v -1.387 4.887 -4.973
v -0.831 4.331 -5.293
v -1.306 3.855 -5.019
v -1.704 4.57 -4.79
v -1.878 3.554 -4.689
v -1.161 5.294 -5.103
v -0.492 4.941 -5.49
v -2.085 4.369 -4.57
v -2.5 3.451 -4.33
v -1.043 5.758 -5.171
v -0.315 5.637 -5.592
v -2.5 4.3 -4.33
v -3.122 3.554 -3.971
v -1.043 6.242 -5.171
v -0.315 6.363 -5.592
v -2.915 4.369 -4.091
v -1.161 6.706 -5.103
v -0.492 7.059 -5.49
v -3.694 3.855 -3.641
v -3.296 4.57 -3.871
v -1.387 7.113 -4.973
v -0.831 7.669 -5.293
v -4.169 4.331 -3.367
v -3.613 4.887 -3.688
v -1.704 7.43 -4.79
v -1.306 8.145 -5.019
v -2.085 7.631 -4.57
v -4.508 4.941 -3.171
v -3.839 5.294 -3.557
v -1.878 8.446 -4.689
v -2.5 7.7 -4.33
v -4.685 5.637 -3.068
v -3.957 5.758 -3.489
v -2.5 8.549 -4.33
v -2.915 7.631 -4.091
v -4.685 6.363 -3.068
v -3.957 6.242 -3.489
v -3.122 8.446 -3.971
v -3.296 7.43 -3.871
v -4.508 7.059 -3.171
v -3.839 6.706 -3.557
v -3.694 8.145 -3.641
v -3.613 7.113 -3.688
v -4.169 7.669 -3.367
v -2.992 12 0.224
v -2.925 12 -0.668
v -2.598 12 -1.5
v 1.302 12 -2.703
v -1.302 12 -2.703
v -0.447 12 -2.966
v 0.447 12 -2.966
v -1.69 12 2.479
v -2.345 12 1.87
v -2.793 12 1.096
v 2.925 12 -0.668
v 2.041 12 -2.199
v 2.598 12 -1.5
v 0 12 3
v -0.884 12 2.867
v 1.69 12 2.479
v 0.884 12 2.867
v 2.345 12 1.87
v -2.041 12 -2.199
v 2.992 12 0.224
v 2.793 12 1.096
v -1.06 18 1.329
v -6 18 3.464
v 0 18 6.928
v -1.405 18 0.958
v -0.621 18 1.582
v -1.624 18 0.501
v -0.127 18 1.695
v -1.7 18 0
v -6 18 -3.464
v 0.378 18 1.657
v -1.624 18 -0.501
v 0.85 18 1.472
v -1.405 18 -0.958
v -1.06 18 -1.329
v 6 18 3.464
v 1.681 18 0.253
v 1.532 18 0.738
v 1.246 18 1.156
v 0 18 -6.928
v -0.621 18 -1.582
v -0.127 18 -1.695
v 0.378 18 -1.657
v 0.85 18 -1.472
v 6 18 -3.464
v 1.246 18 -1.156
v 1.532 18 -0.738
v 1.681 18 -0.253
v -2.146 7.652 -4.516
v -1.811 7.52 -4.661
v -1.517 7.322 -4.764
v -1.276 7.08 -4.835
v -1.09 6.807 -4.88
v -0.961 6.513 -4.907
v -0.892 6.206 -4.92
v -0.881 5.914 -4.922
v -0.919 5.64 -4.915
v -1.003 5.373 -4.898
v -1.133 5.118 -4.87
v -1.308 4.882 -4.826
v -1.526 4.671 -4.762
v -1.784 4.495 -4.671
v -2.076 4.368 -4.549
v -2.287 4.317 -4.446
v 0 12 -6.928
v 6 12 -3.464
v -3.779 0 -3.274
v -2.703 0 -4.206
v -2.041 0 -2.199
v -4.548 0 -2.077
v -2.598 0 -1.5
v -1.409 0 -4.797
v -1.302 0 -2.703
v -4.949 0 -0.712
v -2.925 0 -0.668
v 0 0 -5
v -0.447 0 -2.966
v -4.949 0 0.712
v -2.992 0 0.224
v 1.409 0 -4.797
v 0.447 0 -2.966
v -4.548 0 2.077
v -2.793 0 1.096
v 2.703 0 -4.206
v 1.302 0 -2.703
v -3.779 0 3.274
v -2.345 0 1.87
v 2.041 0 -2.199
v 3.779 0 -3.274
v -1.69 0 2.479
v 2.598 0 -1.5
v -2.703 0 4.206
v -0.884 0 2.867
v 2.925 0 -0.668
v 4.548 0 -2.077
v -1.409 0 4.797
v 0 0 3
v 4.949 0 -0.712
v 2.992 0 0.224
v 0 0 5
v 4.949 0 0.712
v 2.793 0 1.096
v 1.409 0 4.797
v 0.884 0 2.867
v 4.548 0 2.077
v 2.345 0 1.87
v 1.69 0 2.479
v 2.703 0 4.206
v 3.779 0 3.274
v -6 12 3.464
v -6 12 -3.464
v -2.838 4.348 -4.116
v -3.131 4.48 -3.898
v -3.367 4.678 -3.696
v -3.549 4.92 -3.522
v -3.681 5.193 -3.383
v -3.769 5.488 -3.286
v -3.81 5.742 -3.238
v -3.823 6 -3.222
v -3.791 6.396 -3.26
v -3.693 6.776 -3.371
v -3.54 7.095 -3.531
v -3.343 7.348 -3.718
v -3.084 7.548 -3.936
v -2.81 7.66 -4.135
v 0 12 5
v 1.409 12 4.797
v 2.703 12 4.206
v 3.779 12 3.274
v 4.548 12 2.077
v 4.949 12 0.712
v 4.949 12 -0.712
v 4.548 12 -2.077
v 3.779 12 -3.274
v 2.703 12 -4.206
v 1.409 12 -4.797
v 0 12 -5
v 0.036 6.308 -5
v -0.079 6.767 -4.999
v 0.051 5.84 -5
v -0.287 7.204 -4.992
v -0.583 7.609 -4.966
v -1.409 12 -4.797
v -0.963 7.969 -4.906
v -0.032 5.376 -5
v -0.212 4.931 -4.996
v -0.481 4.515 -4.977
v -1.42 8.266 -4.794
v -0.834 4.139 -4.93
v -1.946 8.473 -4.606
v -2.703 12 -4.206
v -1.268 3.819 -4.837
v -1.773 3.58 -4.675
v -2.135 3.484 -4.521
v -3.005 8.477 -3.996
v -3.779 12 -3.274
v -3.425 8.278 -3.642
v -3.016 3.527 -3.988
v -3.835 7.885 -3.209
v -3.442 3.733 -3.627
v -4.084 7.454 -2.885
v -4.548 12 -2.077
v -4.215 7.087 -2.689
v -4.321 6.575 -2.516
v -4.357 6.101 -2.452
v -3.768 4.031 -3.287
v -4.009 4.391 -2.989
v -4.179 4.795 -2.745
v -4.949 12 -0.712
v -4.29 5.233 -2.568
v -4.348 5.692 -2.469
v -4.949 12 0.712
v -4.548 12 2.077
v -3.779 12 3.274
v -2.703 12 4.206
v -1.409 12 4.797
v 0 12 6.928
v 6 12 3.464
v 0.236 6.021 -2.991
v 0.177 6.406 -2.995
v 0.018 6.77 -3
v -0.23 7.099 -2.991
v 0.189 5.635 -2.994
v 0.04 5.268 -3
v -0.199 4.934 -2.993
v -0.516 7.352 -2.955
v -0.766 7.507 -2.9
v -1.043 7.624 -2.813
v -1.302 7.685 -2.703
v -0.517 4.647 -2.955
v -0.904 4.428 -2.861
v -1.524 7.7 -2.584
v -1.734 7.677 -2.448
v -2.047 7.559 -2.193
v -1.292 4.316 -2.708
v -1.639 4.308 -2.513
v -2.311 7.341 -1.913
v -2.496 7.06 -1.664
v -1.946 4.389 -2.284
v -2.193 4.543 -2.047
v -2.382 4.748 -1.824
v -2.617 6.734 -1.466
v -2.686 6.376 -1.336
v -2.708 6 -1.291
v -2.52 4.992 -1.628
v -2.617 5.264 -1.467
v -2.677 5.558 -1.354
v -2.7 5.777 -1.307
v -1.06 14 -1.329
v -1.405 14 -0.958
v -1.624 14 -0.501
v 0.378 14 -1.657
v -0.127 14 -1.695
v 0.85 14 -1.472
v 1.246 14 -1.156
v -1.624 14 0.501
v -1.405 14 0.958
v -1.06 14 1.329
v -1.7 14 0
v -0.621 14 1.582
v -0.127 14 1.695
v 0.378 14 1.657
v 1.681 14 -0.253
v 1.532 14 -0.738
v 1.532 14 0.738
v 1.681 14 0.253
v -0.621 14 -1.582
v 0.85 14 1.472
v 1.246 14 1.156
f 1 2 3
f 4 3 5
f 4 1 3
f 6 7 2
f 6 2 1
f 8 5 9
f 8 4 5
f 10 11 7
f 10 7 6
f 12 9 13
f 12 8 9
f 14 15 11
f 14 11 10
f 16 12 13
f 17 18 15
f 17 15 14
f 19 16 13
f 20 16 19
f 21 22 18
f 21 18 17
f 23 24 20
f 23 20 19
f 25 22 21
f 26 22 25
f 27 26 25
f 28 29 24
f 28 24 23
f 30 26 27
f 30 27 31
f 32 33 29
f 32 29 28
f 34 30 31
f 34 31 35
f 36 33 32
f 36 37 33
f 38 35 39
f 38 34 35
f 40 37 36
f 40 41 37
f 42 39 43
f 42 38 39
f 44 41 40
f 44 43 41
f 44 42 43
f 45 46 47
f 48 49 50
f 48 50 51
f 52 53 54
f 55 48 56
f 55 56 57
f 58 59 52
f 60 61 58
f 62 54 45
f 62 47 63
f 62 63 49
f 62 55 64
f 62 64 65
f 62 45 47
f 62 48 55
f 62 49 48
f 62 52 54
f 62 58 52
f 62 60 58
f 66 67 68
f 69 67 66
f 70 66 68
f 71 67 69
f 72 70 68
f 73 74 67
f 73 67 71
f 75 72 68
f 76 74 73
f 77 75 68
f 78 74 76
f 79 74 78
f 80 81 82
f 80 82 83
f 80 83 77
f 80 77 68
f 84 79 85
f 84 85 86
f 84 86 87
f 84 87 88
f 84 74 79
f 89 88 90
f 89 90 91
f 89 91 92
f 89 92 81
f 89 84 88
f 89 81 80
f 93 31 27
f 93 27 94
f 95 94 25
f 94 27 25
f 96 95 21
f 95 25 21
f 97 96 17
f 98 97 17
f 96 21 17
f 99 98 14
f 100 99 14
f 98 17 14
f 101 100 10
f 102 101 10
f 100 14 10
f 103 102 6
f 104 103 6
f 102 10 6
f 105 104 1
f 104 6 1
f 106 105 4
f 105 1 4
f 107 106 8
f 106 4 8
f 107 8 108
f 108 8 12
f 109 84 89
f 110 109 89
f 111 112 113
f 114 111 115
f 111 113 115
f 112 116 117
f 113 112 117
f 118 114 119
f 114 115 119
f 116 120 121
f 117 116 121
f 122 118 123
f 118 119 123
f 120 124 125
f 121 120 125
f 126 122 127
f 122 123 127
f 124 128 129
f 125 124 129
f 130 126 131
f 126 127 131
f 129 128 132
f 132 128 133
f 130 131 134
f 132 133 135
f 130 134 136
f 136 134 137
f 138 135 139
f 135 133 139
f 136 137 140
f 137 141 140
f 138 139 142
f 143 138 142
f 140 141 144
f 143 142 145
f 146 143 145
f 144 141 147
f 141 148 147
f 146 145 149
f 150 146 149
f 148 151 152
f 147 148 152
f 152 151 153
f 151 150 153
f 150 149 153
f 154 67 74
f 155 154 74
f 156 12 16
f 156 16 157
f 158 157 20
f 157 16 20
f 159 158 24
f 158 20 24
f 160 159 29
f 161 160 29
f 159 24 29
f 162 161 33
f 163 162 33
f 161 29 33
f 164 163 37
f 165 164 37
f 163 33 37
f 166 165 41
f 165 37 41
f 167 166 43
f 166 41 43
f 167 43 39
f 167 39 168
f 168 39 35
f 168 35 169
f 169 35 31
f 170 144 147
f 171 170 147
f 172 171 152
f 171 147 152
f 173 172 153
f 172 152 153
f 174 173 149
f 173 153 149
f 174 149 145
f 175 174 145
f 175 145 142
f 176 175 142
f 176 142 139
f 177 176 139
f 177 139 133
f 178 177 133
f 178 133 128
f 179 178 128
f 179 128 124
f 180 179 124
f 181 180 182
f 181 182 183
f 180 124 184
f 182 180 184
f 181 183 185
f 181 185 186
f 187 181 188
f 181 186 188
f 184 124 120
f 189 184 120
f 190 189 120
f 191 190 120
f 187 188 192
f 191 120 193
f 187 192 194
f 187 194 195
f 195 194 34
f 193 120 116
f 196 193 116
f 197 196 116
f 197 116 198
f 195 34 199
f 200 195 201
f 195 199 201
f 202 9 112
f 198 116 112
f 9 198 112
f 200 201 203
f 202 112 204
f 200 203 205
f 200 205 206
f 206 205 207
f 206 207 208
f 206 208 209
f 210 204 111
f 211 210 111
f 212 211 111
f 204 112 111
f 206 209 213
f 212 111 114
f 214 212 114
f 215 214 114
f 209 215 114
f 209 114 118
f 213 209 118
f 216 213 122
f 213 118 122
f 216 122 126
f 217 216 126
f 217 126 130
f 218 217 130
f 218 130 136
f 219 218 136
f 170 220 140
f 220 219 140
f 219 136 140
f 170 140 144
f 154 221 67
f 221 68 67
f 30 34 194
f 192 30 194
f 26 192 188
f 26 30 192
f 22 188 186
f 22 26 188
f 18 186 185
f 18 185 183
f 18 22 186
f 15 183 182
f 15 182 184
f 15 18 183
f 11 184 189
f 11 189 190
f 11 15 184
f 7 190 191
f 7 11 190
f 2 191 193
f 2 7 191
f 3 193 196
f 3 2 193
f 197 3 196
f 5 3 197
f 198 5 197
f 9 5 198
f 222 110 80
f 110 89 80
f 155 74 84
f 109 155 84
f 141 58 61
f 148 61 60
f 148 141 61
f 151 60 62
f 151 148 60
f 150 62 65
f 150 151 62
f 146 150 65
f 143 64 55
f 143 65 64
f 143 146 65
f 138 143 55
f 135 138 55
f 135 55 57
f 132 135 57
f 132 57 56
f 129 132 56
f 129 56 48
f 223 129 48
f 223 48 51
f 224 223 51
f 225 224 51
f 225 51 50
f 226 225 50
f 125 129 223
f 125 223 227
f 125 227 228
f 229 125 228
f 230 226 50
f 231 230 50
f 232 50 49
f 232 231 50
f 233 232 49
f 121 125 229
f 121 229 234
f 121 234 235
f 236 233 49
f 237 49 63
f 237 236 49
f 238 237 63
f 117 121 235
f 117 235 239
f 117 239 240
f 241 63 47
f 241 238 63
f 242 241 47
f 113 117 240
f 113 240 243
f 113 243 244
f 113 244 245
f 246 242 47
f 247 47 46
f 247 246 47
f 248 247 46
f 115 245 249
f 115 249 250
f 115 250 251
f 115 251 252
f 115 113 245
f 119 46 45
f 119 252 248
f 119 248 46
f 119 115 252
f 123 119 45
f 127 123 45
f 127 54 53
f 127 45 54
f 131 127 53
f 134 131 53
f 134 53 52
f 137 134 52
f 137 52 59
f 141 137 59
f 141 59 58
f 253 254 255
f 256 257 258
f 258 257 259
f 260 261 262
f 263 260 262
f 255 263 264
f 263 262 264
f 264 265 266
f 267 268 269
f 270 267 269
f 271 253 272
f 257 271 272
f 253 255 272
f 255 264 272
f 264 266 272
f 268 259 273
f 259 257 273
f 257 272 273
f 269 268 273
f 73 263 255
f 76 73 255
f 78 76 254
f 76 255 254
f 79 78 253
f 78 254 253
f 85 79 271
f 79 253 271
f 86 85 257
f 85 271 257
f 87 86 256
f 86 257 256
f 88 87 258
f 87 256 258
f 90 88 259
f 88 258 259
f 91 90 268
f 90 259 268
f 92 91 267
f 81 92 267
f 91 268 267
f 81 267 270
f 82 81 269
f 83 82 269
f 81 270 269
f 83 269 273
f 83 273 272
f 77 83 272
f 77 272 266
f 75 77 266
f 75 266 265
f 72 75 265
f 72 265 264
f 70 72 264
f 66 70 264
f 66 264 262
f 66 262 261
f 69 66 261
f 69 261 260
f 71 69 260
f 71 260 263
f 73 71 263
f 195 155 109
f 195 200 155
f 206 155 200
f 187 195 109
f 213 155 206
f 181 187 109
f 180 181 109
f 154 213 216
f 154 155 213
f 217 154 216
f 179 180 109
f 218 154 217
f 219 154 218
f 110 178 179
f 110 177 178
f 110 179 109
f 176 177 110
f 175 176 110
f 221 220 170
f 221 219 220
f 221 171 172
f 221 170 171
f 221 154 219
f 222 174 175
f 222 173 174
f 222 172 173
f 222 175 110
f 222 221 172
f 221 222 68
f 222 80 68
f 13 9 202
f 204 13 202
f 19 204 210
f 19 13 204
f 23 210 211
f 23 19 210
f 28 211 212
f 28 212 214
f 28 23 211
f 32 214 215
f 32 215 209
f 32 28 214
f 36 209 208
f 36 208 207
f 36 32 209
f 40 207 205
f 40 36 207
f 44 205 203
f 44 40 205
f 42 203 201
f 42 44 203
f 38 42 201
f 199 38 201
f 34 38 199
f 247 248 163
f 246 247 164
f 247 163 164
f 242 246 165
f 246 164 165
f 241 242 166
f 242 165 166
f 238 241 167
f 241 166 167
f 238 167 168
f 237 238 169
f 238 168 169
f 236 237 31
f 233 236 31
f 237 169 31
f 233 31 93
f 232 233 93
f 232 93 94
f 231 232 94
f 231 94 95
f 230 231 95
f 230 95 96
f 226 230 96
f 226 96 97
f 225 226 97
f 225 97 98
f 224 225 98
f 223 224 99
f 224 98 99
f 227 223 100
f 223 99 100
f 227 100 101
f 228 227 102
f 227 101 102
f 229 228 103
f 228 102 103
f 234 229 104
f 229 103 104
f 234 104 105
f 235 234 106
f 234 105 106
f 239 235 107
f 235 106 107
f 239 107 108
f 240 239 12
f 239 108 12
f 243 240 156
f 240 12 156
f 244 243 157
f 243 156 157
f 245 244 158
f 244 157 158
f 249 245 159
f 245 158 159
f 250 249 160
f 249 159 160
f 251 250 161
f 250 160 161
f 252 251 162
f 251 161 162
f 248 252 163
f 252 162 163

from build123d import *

# Parameters (mm, degrees)
SKETCH1_R                 = 5
SKETCH1_R_2               = 3
BOSS_EXTRUDE1_DEPTH       = 14
BOSS_EXTRUDE2_DEPTH       = 4
M3_CLEARANCE_HOLE1_D      = 3.4
M3_CLEARANCE_HOLE2_REACH  = 25.495
M3_CLEARANCE_HOLE2_BORE_R = 1.7
BOSS_EXTRUDE3_REACH       = 25.495
BOSS_EXTRUDE3_END_RADIUS  = 5
SKETCH11_R                = 2.549362178
SKETCH11_R_2              = 1.7
SKETCH14_R                = 2.549362178
CUT_EXTRUDE2_DEPTH        = 1
BOSS_EXTRUDE4_DEPTH       = 2


with BuildPart() as part:
    # Sketch1 → Boss-Extrude1 (new body)
    with BuildSketch(Plane(origin=(0, 0, 0), x_dir=(1, 0, 0), z_dir=(0, 1, 0))):
        with Locations(Location((0, 0, 0), (0, 0, 270))):
            Circle(SKETCH1_R)
        with Locations(Location((0, 0, 0), (0, 0, 270))):
            Circle(SKETCH1_R_2, mode=Mode.SUBTRACT)
    extrude(amount=BOSS_EXTRUDE1_DEPTH)

    # Sketch2 → Boss-Extrude2 (add)
    with BuildSketch(Plane(origin=(0, 14, 0), x_dir=(1, 0, 0), z_dir=(0, 1, 0))):
        Polygon((0, 6.92820323), (-6, 3.464101615), (-6, -3.464101615), (0, -6.92820323), (6, -3.464101615), (6, 3.464101615), align=None)
    extrude(amount=BOSS_EXTRUDE2_DEPTH)

    # M3 Clearance Hole1 (through all)
    with Locations(Plane(origin=(0, 18, 0), x_dir=(1, 0, 0), z_dir=(0, 1, 0))):
        with Locations((0, 0)):
            Hole(M3_CLEARANCE_HOLE1_D / 2)

    # M3 Clearance Hole2 bore → M3 Clearance Hole2 (cut, up to next)
    with BuildSketch(Plane(origin=(-3, 0, -5.196152423), x_dir=(-0.8660254037844386, 0, 0.5000000000000003), z_dir=(-0.5000000000000002, 0, -0.8660254037844385)), mode=Mode.PRIVATE) as m3_clearance_hole2_sk1:
        with Locations((0, 6)):
            Circle(M3_CLEARANCE_HOLE2_BORE_R)
    m3_clearance_hole2_tool1 = extrude(m3_clearance_hole2_sk1.sketch, amount=-M3_CLEARANCE_HOLE2_REACH, mode=Mode.PRIVATE) & part.part
    add(m3_clearance_hole2_tool1.solids().sort_by_distance((-3, 6, -5.196152))[0], mode=Mode.SUBTRACT)

    # Boss-Extrude3: up to this cylinder (the profile starts outside it)
    boss_extrude3_end = Plane(origin=(0, 6, 0), z_dir=(0, -1, 0)) * Cylinder(BOSS_EXTRUDE3_END_RADIUS, 61.99, mode=Mode.PRIVATE)
    # Sketch11 → Boss-Extrude3 (add, up to the surface)
    with BuildSketch(Plane(origin=(-3, 0, -5.196152423), x_dir=(-0.8660254037844386, 0, 0.5000000000000003), z_dir=(-0.5000000000000002, 0, -0.8660254037844385)), mode=Mode.PRIVATE) as boss_extrude3_sk1:
        with Locations((0, 6)):
            Circle(SKETCH11_R)
        with Locations((0, 6)):
            Circle(SKETCH11_R_2, mode=Mode.SUBTRACT)
    boss_extrude3_tool1 = extrude(boss_extrude3_sk1.sketch, amount=-BOSS_EXTRUDE3_REACH, mode=Mode.PRIVATE) - boss_extrude3_end
    add(boss_extrude3_tool1.solids().sort_by_distance((-0.854634, 6, -6.43478))[0])

    # Sketch14 → Cut-Extrude2 (cut)
    with BuildSketch(Plane(origin=(-3, 0, -5.196152423), x_dir=(-0.8660254037844384, 0, 0.5000000000000004), z_dir=(-0.5000000000000004, 0, -0.8660254037844384))):
        with Locations((0, 6)):
            Circle(SKETCH14_R)
    extrude(amount=-CUT_EXTRUDE2_DEPTH, mode=Mode.SUBTRACT)

    # Sketch19 → Boss-Extrude4 (add)
    with BuildSketch(Plane.XZ.offset(-14)):
        Polygon((0, -6.92820323), (6, -3.464101615), (6, 3.464101615), (0, 6.92820323), (-6, 3.464101615), (-6, -3.464101615), align=None)
    extrude(amount=BOSS_EXTRUDE4_DEPTH)


solid = part.part
